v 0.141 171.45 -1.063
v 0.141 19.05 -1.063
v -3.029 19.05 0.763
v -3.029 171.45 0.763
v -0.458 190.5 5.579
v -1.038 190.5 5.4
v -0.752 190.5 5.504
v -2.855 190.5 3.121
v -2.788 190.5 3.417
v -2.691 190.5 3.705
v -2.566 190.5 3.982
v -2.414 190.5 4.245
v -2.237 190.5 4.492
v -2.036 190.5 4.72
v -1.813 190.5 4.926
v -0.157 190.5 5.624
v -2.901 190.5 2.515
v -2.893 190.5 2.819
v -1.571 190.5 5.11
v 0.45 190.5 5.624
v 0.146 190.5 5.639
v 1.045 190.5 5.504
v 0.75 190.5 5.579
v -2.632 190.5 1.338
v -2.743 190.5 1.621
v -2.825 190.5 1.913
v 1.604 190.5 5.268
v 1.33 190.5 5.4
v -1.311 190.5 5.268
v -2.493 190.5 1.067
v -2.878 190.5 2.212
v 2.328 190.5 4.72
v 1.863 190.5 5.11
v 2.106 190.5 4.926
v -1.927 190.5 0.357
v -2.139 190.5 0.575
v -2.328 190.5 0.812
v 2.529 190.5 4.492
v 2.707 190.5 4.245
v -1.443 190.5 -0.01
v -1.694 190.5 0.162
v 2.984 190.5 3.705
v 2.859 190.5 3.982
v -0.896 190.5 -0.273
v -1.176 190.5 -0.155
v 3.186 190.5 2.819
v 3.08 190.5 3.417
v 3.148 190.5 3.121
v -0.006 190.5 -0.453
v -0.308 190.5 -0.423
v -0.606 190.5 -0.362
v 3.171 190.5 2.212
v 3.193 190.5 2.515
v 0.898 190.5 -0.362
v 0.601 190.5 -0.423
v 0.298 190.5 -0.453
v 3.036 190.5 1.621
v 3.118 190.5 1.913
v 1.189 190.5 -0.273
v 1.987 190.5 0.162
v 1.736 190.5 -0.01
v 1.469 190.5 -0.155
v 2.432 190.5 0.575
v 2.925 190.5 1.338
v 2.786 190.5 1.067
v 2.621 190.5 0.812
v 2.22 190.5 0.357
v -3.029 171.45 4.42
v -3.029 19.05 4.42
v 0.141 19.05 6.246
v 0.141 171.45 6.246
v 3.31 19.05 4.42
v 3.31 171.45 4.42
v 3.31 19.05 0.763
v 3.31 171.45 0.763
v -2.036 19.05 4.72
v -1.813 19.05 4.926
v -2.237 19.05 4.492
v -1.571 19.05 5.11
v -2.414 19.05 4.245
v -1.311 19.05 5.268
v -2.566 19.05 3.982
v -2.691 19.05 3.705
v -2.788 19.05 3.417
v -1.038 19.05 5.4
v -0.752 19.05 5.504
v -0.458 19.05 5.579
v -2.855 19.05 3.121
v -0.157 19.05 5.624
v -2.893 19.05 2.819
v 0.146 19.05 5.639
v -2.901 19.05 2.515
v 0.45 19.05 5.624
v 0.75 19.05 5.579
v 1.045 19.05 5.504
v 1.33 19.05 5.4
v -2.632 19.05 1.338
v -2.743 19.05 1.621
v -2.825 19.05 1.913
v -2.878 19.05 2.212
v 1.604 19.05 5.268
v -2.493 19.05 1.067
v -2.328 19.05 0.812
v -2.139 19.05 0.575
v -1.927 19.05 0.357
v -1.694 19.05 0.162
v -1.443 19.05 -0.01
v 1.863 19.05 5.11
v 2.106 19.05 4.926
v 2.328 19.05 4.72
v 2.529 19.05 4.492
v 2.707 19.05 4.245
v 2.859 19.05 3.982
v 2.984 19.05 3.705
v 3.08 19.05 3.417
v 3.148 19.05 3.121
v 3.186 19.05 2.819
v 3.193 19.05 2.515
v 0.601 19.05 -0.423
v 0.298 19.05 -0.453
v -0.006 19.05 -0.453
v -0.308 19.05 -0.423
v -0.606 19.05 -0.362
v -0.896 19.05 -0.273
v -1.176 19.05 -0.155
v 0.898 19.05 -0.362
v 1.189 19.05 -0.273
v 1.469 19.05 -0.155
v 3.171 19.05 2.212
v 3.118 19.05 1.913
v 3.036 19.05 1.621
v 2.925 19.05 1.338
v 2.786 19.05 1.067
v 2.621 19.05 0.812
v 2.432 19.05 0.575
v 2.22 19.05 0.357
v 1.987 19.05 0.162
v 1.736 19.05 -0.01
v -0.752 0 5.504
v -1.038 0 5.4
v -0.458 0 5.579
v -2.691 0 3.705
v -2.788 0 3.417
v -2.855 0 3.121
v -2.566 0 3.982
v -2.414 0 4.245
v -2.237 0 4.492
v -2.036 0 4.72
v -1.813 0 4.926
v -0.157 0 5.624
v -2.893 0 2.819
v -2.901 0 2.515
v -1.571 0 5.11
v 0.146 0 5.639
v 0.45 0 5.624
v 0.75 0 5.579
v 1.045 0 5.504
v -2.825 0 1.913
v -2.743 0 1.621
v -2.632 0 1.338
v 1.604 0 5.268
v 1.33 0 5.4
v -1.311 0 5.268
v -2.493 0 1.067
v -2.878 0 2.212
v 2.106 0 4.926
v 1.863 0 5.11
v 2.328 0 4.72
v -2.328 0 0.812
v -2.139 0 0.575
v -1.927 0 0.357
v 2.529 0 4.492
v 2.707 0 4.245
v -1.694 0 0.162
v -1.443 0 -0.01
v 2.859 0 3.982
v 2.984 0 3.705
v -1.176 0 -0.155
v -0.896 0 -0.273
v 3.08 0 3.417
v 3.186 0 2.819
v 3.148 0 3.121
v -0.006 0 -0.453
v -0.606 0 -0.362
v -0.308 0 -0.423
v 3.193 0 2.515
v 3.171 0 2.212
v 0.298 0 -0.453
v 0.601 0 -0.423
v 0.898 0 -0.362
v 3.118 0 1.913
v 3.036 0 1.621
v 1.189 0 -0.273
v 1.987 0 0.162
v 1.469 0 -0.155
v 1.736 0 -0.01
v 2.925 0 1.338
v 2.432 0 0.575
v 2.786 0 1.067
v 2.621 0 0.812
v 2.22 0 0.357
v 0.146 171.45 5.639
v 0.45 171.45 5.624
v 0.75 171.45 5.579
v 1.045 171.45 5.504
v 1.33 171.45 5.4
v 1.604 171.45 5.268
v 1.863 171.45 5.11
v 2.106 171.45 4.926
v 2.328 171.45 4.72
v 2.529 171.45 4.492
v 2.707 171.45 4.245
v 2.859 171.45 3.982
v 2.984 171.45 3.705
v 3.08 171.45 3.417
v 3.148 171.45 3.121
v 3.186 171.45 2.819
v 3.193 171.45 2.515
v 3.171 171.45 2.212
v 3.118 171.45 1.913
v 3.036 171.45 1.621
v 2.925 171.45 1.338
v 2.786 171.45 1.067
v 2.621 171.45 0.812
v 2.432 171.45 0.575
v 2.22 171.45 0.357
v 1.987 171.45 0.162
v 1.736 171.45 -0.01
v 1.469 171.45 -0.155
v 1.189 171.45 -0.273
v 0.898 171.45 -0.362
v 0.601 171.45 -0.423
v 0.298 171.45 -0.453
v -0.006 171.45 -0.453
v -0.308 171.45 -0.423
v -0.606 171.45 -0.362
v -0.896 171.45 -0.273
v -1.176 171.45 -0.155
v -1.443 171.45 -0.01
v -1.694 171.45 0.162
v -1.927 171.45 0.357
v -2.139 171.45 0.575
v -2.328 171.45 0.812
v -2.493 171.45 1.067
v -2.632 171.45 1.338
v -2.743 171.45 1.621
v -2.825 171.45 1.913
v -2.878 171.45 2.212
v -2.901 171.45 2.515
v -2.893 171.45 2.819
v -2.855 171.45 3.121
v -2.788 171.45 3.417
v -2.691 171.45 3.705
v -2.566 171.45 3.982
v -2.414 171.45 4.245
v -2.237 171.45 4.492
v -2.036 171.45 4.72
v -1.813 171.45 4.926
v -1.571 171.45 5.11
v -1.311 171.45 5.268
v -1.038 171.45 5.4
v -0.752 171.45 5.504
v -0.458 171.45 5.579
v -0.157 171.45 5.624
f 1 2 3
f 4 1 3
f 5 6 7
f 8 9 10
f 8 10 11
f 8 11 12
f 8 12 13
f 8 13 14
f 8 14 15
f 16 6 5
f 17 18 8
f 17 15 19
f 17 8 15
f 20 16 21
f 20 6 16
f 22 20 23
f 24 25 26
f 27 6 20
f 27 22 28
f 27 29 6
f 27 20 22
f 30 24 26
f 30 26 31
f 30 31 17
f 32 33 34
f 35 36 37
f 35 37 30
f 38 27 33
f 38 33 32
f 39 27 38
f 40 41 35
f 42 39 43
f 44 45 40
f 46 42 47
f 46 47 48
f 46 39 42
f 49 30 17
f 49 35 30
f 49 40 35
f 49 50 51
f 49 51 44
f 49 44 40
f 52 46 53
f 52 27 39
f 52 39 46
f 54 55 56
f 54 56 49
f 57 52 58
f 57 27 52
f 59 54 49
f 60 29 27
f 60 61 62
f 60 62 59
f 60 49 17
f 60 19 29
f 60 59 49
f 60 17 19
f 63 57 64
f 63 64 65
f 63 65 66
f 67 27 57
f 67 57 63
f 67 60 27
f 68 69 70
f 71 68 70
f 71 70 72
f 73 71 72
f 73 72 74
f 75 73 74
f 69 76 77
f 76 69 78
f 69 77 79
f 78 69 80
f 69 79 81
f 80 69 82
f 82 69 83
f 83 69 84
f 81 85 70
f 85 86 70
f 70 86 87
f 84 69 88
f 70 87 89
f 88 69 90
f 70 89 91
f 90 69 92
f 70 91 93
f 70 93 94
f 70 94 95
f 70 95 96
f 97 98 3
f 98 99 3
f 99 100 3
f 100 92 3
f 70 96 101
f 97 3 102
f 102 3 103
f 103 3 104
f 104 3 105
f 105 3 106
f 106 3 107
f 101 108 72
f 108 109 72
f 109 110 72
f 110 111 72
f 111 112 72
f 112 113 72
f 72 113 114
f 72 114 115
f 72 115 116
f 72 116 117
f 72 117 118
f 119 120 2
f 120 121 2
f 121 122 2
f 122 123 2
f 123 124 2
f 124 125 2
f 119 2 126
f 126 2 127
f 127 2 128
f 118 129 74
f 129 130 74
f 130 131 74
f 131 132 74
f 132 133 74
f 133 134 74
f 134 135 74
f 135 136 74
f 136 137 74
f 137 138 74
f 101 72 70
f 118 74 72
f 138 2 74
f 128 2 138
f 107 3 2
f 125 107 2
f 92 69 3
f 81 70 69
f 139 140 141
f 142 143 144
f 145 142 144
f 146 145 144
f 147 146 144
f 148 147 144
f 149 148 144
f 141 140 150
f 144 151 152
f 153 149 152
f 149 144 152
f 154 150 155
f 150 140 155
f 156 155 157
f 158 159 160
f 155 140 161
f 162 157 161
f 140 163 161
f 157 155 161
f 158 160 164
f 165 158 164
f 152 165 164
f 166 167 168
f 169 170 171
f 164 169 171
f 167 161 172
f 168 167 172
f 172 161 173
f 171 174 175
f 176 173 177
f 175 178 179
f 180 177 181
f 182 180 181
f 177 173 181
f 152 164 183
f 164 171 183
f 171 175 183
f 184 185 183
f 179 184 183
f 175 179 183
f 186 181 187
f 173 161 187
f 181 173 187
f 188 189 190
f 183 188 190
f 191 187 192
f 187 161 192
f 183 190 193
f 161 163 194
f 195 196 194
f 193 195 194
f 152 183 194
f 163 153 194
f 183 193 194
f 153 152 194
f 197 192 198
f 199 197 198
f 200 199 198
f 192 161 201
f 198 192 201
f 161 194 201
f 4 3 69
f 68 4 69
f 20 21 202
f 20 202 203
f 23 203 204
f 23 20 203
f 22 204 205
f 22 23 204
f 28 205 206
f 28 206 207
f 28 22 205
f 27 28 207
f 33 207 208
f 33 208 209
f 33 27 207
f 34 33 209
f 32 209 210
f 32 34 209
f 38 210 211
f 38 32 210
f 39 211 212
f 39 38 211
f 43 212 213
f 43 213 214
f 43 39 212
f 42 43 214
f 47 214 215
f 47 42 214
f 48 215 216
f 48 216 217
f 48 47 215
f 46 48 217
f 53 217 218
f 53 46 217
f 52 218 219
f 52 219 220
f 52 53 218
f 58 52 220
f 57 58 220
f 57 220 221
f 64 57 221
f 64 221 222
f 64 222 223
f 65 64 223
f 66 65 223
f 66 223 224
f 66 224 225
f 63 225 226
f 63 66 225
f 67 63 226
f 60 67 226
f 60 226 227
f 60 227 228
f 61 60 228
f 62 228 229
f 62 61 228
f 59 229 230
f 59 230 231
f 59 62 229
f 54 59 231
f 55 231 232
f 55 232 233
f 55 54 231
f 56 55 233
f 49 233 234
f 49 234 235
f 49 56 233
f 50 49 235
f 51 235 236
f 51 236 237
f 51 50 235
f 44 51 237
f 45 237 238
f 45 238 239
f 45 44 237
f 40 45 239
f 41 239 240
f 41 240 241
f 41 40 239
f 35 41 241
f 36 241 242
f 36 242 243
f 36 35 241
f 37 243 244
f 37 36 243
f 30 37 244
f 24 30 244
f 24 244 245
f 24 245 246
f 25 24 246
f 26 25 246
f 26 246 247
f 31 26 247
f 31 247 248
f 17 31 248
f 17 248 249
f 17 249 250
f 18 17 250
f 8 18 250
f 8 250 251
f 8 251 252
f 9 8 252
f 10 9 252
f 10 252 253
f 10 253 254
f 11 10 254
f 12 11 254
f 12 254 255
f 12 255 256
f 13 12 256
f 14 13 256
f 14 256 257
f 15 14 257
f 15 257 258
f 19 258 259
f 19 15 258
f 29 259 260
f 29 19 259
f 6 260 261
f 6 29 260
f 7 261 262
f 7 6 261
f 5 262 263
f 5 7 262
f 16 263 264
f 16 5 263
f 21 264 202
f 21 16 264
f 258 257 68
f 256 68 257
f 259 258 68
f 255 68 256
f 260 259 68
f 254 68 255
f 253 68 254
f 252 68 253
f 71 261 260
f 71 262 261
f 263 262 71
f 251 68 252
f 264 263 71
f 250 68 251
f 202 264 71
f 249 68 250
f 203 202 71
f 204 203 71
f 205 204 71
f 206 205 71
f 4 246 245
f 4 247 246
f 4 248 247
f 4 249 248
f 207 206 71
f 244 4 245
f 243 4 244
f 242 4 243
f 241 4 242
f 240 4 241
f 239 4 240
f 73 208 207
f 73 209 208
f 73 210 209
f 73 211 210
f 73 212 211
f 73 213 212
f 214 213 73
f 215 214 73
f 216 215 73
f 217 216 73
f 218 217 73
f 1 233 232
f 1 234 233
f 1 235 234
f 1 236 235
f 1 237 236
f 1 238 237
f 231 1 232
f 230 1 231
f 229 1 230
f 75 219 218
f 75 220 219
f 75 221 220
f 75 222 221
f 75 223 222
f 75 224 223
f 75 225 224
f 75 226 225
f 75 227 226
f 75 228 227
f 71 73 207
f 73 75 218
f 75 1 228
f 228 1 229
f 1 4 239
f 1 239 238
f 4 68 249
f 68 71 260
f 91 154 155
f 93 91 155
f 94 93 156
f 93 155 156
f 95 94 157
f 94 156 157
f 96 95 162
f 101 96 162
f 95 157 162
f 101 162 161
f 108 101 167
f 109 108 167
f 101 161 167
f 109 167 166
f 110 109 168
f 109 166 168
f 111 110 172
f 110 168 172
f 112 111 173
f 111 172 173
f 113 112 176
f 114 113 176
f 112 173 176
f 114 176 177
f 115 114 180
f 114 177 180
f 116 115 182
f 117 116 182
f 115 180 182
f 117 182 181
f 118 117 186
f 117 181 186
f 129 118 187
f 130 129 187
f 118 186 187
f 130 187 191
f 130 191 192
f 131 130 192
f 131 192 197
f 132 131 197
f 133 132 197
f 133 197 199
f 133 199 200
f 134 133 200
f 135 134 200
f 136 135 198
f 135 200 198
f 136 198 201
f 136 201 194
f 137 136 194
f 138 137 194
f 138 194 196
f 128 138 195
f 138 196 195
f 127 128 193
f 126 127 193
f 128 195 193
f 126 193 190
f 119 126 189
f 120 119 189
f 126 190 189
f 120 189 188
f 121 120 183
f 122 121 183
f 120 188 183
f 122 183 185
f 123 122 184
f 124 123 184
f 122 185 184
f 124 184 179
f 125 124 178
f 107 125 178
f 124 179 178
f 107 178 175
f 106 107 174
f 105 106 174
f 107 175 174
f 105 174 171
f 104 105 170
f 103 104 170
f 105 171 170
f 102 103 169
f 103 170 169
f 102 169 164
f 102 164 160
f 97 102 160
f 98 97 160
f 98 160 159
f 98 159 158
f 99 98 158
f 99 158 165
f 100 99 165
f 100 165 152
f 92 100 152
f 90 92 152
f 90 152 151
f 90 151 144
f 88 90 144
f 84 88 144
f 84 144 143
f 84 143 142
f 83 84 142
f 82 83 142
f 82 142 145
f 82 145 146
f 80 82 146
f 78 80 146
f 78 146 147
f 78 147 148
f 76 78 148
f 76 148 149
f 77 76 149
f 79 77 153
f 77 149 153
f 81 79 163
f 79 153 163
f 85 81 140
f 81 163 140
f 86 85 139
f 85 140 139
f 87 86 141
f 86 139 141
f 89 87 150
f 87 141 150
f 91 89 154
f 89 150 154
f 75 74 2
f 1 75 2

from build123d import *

# Parameters (mm, degrees)
BOSS_EXTRUDE1_DEPTH = 190.5
SKETCH2_OUTSIDE_W   = 46.489
SKETCH2_OUTSIDE_H   = 47.459
SKETCH2_OUTSIDE_R   = 3.048
CUT_EXTRUDE1_DEPTH  = 19.05


with BuildPart() as part:
    # Sketch1 → Boss-Extrude1 (new body)
    with BuildSketch(Plane(origin=(0, 0, 0), x_dir=(1, 0, 0), z_dir=(0, 1, 0))):
        Polygon((3.310191022, -4.420128359), (3.310191022, -0.762528359), (0.140765019, 1.063061018), (-3.028660983, -0.762528359), (-3.028660983, -4.420128359), (0.140765019, -6.245717737), align=None)
    extrude(amount=BOSS_EXTRUDE1_DEPTH)

    # Sketch2 outside → Cut-Extrude1 (cut)
    with BuildSketch(Plane(origin=(0, 190.5, 0), x_dir=(1, 0, 0), z_dir=(0, 1, 0))):
        with Locations((0.1405, -2.5915)):
            Rectangle(SKETCH2_OUTSIDE_W, SKETCH2_OUTSIDE_H)
        with Locations(Location((0.146339017, -2.591328359, 0), (0, 0, 270))):
            Circle(SKETCH2_OUTSIDE_R, mode=Mode.SUBTRACT)
    cut_extrude1 = extrude(amount=-CUT_EXTRUDE1_DEPTH, mode=Mode.SUBTRACT)

    # Mirror1: Cut-Extrude1 across plane
    add(cut_extrude1.mirror(Plane.ZX.offset(95.25)), mode=Mode.SUBTRACT)


solid = part.part
